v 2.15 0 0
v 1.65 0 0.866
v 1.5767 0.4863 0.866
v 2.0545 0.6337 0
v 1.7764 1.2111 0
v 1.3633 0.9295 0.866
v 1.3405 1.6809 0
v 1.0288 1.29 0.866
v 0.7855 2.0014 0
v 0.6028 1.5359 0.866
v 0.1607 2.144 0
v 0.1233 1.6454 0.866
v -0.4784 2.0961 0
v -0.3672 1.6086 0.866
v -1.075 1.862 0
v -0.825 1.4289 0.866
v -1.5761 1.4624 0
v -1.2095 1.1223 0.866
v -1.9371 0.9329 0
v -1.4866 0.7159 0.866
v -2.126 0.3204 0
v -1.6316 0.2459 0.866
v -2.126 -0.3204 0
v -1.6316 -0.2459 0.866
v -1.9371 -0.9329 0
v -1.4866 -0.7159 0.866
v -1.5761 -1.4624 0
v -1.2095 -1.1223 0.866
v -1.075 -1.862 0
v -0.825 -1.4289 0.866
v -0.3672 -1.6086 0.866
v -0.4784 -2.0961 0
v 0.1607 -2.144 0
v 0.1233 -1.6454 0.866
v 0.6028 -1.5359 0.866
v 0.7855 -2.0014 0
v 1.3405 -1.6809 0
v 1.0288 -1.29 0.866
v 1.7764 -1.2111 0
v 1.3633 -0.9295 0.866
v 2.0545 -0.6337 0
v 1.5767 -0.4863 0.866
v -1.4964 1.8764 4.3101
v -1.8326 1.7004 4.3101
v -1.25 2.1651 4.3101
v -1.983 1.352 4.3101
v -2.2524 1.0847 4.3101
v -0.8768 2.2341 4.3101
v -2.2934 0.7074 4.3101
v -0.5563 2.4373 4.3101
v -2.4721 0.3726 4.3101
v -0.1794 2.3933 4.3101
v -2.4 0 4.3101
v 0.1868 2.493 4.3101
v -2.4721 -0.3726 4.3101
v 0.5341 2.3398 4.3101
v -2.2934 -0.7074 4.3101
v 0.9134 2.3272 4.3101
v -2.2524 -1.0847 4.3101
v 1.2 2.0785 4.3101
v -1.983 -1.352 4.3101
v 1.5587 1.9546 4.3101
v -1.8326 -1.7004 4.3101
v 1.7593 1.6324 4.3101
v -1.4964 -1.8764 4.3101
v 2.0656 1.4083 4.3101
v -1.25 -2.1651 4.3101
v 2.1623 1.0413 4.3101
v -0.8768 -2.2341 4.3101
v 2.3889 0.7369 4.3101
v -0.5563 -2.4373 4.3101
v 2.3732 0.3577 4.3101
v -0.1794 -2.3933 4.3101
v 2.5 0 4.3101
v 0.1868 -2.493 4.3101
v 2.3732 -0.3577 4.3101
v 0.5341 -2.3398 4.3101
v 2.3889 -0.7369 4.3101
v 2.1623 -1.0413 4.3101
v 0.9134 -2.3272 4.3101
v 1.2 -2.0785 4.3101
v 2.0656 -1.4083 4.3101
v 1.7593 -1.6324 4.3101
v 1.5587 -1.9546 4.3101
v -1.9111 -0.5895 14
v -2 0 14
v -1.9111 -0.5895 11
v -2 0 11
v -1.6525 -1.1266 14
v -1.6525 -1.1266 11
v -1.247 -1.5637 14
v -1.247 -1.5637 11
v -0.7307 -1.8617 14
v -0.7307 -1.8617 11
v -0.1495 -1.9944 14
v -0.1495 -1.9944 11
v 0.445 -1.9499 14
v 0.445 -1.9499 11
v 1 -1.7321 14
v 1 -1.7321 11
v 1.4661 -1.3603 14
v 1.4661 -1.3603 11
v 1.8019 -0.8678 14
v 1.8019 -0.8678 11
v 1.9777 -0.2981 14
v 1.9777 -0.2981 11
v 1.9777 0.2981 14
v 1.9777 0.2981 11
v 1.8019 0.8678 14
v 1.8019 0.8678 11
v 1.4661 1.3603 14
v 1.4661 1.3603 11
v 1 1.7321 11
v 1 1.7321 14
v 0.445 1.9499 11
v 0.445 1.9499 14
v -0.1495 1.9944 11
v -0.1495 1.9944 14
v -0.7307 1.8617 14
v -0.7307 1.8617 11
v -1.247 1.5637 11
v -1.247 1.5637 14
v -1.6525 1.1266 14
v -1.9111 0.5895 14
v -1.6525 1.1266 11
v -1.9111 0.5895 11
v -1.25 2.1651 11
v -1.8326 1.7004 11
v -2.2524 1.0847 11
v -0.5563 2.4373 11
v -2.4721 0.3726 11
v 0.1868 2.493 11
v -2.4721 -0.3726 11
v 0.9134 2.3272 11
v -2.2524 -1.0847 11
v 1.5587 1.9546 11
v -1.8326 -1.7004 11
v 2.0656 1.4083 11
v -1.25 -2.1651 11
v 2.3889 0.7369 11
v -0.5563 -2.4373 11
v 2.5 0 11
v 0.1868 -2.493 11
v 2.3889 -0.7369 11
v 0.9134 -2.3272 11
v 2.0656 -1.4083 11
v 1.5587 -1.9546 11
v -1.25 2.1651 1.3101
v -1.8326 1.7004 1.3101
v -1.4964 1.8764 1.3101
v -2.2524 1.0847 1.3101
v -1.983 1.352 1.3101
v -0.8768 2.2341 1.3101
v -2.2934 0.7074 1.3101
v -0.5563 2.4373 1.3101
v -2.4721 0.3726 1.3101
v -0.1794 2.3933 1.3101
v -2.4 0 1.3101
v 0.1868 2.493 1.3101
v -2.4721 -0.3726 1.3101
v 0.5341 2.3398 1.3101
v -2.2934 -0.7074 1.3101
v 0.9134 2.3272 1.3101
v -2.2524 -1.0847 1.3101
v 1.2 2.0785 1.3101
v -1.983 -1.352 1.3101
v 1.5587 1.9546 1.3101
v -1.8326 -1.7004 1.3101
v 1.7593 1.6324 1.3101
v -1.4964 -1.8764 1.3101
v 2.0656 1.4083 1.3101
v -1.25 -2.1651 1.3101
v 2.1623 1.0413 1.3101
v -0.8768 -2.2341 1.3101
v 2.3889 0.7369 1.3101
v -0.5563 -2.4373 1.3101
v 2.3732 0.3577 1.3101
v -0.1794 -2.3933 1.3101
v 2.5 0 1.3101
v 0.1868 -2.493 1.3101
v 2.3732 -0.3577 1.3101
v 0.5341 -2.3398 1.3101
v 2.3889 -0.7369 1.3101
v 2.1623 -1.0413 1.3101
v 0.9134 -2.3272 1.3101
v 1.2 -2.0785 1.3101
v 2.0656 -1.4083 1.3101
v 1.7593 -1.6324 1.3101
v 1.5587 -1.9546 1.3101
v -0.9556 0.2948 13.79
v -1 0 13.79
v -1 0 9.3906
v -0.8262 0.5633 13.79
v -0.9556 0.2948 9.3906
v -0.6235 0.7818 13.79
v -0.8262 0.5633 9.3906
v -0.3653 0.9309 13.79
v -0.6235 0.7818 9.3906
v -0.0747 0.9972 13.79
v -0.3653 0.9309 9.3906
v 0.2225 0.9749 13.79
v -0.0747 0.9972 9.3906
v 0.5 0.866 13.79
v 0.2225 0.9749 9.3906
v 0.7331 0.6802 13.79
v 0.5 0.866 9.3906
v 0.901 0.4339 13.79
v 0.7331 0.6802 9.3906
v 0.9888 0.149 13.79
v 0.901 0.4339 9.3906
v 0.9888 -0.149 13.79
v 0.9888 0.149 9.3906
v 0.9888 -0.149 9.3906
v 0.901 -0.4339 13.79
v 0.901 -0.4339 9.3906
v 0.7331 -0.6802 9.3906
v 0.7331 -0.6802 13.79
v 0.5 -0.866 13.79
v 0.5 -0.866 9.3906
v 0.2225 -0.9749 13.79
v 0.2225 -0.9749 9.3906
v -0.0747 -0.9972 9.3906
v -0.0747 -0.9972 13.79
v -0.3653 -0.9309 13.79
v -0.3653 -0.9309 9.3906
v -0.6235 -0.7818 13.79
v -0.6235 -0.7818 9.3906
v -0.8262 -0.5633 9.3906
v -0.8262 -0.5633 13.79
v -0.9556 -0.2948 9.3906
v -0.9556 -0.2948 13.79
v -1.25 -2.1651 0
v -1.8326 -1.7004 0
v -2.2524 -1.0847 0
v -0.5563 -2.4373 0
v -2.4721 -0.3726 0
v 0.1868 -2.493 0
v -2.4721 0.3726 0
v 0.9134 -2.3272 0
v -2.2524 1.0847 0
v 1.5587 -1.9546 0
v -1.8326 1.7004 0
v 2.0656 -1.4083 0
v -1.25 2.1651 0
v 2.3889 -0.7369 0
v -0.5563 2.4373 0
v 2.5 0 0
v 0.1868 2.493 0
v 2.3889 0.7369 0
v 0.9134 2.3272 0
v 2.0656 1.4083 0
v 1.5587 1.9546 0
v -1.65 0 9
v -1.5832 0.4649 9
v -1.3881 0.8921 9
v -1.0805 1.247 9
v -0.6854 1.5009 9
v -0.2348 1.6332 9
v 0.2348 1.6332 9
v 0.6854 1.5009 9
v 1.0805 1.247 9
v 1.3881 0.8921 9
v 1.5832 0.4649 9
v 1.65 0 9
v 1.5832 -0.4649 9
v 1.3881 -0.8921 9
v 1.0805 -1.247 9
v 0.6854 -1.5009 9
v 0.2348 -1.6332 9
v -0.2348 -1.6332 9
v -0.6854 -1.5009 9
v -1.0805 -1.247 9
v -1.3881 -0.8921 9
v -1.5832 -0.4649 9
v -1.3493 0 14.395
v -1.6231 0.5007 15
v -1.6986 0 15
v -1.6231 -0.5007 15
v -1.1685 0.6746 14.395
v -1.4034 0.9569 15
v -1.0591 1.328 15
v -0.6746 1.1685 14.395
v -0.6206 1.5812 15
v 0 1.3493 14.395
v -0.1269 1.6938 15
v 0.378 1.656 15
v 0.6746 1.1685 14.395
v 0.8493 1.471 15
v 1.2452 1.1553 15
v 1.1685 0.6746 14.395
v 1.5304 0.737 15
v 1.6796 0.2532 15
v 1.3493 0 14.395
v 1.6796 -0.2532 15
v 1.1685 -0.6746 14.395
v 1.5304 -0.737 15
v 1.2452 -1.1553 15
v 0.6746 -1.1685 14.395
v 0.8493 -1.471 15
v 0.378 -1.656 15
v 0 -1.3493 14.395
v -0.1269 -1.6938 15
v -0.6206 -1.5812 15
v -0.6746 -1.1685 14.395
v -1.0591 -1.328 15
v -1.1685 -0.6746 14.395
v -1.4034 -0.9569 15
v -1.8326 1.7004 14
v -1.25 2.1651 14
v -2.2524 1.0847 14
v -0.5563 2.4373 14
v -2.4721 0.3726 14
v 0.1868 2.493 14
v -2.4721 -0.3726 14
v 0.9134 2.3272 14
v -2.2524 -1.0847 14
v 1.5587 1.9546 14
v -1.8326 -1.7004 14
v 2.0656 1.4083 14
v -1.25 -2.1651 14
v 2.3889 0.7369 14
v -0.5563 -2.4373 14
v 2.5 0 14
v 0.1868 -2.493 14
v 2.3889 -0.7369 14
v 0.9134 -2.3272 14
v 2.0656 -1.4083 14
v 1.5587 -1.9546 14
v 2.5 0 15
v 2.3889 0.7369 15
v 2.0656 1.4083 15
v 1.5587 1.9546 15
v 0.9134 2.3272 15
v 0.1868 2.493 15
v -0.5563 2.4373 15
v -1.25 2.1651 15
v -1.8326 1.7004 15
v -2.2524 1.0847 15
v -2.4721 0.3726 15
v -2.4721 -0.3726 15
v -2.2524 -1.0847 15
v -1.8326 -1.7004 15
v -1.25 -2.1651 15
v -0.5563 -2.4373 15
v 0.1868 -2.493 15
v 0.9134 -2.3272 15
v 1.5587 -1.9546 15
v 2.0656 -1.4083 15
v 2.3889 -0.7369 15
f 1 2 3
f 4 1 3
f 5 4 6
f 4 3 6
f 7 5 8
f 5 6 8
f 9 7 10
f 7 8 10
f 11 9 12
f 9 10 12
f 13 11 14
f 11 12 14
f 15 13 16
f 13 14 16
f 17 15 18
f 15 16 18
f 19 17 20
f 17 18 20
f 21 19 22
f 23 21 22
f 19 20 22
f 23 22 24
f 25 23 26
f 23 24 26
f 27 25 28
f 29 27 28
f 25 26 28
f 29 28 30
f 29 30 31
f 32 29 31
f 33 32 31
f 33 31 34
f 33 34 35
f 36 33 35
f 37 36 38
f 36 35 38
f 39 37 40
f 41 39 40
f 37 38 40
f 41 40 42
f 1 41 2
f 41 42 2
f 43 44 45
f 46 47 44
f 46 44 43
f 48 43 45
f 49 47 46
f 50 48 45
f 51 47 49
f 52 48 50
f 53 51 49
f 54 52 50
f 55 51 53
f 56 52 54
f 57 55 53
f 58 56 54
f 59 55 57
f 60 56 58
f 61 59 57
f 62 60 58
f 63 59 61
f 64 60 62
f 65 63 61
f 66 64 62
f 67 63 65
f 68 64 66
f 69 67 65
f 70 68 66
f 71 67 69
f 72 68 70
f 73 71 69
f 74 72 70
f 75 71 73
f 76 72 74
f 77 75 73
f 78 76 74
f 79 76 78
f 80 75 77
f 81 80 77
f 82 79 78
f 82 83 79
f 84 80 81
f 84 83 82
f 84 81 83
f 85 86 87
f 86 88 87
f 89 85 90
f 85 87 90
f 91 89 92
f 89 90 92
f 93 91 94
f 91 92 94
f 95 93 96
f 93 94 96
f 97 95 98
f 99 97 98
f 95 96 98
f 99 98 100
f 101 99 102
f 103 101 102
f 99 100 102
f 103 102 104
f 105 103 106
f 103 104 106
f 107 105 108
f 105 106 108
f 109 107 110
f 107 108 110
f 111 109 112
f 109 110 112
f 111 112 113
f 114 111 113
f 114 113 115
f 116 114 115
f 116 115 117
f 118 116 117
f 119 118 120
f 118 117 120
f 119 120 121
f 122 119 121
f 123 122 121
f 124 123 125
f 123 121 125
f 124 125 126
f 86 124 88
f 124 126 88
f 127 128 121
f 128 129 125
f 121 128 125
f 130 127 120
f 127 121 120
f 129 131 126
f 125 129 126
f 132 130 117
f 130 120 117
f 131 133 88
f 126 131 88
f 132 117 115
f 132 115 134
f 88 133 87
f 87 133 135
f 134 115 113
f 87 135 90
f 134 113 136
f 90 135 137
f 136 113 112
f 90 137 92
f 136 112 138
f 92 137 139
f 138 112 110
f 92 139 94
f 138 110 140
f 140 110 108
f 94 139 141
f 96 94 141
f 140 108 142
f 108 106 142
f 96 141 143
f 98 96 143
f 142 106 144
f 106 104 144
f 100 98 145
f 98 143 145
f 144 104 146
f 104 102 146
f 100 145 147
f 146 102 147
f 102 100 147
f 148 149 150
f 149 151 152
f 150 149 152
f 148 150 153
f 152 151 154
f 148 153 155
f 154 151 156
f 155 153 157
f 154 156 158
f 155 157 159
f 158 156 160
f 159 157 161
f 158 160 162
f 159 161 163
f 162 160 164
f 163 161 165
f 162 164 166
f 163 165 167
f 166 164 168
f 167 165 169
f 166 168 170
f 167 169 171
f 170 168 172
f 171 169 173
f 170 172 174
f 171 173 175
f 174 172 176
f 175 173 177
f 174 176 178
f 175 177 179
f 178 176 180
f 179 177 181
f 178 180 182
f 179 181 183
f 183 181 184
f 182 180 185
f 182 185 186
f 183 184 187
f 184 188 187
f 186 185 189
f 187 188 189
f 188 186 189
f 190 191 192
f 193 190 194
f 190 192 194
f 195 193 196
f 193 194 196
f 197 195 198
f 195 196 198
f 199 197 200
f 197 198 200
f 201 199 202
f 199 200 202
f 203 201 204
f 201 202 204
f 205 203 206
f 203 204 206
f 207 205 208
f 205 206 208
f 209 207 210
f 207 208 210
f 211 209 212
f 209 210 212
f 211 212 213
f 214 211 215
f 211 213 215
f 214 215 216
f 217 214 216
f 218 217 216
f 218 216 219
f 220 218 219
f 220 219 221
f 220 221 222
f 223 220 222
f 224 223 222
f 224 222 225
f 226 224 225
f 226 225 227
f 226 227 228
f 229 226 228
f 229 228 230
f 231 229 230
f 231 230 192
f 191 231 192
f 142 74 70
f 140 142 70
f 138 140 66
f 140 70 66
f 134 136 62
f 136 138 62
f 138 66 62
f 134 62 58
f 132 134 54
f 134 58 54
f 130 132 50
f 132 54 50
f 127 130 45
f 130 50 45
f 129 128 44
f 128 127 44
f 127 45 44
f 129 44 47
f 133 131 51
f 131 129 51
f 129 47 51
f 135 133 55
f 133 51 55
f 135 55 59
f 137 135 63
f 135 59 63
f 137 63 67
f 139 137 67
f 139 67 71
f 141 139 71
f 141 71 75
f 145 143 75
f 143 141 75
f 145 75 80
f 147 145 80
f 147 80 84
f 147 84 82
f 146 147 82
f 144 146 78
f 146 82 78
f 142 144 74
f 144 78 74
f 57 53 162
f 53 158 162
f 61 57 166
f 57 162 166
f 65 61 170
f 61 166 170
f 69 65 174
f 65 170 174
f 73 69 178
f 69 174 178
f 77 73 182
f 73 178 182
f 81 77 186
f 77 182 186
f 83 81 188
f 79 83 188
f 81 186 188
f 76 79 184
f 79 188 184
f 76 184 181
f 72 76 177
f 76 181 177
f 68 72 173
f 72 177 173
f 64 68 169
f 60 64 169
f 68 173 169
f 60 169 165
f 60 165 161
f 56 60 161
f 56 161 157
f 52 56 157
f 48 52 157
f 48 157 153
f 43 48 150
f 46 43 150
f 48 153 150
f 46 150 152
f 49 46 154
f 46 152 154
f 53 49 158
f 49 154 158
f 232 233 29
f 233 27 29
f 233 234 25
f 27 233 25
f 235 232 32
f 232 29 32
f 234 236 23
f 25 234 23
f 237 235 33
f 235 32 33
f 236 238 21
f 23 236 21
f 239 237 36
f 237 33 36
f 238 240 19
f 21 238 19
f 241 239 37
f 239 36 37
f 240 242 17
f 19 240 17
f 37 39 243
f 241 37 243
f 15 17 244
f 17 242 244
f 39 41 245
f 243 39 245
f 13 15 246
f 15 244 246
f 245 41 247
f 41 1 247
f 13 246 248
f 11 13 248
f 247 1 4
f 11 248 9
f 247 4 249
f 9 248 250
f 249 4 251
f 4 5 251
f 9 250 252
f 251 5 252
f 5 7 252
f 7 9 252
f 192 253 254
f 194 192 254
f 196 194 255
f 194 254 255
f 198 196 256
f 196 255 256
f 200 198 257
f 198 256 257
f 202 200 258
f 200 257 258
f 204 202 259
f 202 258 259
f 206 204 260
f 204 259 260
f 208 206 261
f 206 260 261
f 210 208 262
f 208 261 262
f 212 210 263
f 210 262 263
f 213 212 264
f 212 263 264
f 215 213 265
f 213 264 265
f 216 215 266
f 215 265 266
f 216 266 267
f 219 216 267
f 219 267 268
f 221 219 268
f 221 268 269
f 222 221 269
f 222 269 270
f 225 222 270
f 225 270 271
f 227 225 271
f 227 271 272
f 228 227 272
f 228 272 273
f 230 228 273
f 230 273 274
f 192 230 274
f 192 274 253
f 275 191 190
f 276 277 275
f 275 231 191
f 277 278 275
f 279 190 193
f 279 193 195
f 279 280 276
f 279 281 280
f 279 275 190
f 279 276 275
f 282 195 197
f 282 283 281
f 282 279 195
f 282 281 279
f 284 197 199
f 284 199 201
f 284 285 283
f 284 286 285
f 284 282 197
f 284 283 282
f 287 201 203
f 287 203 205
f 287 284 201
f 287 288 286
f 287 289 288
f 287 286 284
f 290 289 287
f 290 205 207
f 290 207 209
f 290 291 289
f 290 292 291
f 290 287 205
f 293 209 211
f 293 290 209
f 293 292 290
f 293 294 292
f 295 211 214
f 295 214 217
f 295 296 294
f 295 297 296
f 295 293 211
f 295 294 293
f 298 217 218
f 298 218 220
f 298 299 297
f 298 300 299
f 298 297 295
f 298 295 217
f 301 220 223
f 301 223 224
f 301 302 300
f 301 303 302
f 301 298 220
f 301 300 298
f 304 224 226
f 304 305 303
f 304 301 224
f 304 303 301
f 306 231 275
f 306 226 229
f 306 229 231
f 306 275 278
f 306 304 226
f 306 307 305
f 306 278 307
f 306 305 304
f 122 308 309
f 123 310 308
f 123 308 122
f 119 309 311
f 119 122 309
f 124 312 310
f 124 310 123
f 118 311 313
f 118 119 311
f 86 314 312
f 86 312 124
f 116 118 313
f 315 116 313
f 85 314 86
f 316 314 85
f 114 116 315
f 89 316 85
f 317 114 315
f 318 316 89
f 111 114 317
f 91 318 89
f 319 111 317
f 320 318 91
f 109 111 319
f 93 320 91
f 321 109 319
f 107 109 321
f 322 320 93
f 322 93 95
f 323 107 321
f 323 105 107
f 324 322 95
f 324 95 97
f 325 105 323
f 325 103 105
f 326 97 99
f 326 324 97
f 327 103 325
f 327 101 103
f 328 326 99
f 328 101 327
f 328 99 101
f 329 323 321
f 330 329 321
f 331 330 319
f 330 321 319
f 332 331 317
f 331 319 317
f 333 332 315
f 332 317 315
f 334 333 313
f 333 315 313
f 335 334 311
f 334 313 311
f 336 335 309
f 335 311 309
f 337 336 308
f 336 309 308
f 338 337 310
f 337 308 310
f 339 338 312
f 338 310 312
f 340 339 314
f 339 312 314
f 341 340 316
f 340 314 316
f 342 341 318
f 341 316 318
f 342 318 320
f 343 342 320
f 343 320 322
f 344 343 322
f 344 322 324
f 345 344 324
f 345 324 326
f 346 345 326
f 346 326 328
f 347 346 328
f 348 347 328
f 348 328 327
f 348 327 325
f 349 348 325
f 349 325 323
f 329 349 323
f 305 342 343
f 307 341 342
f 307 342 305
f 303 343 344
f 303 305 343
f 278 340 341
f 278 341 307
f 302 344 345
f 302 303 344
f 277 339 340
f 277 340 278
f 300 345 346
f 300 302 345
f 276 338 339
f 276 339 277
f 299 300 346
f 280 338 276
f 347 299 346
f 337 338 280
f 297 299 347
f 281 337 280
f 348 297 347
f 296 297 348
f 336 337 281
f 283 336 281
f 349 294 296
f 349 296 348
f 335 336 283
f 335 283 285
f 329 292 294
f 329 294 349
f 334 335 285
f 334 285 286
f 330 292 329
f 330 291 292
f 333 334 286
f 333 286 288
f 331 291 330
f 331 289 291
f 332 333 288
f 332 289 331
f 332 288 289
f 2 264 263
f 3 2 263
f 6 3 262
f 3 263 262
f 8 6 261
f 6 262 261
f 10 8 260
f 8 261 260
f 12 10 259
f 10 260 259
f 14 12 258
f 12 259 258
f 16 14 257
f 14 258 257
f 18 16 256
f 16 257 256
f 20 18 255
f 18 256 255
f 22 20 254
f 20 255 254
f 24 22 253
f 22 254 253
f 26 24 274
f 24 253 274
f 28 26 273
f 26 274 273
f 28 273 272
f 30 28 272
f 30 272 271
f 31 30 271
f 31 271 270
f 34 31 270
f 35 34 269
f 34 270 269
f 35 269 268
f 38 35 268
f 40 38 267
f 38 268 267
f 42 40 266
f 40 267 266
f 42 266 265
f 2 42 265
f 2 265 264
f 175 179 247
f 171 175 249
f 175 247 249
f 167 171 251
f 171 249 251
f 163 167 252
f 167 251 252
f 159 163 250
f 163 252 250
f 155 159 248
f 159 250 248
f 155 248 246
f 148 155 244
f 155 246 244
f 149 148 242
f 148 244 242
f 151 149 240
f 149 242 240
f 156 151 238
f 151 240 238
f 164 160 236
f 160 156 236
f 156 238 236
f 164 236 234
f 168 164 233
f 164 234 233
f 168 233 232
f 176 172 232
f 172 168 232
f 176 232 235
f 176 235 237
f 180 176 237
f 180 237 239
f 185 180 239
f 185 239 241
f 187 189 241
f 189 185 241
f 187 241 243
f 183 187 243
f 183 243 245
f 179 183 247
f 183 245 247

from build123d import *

# Parameters (mm, degrees)
SKETCH1_R                       = 2.5
BOSS_EXTRUDE1_DEPTH             = 15
SKETCH2_R                       = 1
CUT_EXTRUDE1_DEPTH              = 16.411035007
TAP_DRILL_FOR_M4X0_7_TAP1_D     = 3.3
TAP_DRILL_FOR_M4X0_7_TAP1_DEPTH = 9
TAP_DRILL_FOR_M4X0_7_TAP1_TIP   = 0.991420021
SKETCH5_W                       = 3
SKETCH5_H                       = 1.793791595
SKETCH5_H_2                     = 1.526677924
CHAMFER1_SIZE                   = 0.5
CHAMFER1_SIZE2                  = 0.866025404
CHAMFER2_SIZE                   = 1.21
CHAMFER2_SIZE2                  = 0.698593826


with BuildPart() as part:
    # Sketch1 → Boss-Extrude1 (new body)
    with BuildSketch(Plane.XY):
        Circle(SKETCH1_R)
    extrude(amount=BOSS_EXTRUDE1_DEPTH)

    # Sketch2 → Cut-Extrude1 (cut, through all)
    with BuildSketch(Plane(origin=(0, 0, 0), x_dir=(-1, 0, 0), z_dir=(0, 0, -1))):
        Circle(SKETCH2_R)
    extrude(amount=-CUT_EXTRUDE1_DEPTH, mode=Mode.SUBTRACT)

    # Tap Drill for M4x0.7 Tap1
    with Locations(Plane(origin=(0, 0, 0), x_dir=(-1, 0, 0), z_dir=(0, 0, -1))):
        with Locations((0, 0)):
            Hole(TAP_DRILL_FOR_M4X0_7_TAP1_D / 2, depth=TAP_DRILL_FOR_M4X0_7_TAP1_DEPTH)
            with Locations((0, 0, -(TAP_DRILL_FOR_M4X0_7_TAP1_DEPTH + TAP_DRILL_FOR_M4X0_7_TAP1_TIP / 2))):  # 118° drill point
                Cone(0, TAP_DRILL_FOR_M4X0_7_TAP1_D / 2, TAP_DRILL_FOR_M4X0_7_TAP1_TIP, mode=Mode.SUBTRACT)

    # Sketch5 → Cut-Revolve1 (revolve, cut)
    with BuildSketch(Plane(origin=(0, 0, 0), x_dir=(0, 0, -1), z_dir=(1, 0, 0)), mode=Mode.PRIVATE) as cut_revolve1_sk:
        with Locations((-12.5, 2.896895798)):
            Rectangle(SKETCH5_W, SKETCH5_H)
        with Locations((-2.810109468, 3.163338962)):
            Rectangle(SKETCH5_W, SKETCH5_H_2)
    revolve(cut_revolve1_sk.sketch.rotate(Axis((0, 0, 0), (0, 0, 1)), 90), axis=Axis((0, 0, 0), (0, 0, 1)), mode=Mode.SUBTRACT)

    # Chamfer1
    chamfer1_edges = [part.edges().sort_by_distance(p)[0] for p in [
        (-1.65, 0, 0),
    ]]
    chamfer1_side = [part.faces().sort_by_distance(p)[0] for p in [
        (-2.429289322, 0, 0),
    ]]
    chamfer(chamfer1_edges, length=CHAMFER1_SIZE, length2=CHAMFER1_SIZE2, reference=chamfer1_side[0])

    # Chamfer2
    chamfer2_edges = [part.edges().sort_by_distance(p)[0] for p in [
        (1, 0, 15),
    ]]
    chamfer2_side = [part.faces().sort_by_distance(p)[0] for p in [
        (1, 0, 12.195279701),
    ]]
    chamfer(chamfer2_edges, length=CHAMFER2_SIZE, length2=CHAMFER2_SIZE2, reference=chamfer2_side[0])


solid = part.part
